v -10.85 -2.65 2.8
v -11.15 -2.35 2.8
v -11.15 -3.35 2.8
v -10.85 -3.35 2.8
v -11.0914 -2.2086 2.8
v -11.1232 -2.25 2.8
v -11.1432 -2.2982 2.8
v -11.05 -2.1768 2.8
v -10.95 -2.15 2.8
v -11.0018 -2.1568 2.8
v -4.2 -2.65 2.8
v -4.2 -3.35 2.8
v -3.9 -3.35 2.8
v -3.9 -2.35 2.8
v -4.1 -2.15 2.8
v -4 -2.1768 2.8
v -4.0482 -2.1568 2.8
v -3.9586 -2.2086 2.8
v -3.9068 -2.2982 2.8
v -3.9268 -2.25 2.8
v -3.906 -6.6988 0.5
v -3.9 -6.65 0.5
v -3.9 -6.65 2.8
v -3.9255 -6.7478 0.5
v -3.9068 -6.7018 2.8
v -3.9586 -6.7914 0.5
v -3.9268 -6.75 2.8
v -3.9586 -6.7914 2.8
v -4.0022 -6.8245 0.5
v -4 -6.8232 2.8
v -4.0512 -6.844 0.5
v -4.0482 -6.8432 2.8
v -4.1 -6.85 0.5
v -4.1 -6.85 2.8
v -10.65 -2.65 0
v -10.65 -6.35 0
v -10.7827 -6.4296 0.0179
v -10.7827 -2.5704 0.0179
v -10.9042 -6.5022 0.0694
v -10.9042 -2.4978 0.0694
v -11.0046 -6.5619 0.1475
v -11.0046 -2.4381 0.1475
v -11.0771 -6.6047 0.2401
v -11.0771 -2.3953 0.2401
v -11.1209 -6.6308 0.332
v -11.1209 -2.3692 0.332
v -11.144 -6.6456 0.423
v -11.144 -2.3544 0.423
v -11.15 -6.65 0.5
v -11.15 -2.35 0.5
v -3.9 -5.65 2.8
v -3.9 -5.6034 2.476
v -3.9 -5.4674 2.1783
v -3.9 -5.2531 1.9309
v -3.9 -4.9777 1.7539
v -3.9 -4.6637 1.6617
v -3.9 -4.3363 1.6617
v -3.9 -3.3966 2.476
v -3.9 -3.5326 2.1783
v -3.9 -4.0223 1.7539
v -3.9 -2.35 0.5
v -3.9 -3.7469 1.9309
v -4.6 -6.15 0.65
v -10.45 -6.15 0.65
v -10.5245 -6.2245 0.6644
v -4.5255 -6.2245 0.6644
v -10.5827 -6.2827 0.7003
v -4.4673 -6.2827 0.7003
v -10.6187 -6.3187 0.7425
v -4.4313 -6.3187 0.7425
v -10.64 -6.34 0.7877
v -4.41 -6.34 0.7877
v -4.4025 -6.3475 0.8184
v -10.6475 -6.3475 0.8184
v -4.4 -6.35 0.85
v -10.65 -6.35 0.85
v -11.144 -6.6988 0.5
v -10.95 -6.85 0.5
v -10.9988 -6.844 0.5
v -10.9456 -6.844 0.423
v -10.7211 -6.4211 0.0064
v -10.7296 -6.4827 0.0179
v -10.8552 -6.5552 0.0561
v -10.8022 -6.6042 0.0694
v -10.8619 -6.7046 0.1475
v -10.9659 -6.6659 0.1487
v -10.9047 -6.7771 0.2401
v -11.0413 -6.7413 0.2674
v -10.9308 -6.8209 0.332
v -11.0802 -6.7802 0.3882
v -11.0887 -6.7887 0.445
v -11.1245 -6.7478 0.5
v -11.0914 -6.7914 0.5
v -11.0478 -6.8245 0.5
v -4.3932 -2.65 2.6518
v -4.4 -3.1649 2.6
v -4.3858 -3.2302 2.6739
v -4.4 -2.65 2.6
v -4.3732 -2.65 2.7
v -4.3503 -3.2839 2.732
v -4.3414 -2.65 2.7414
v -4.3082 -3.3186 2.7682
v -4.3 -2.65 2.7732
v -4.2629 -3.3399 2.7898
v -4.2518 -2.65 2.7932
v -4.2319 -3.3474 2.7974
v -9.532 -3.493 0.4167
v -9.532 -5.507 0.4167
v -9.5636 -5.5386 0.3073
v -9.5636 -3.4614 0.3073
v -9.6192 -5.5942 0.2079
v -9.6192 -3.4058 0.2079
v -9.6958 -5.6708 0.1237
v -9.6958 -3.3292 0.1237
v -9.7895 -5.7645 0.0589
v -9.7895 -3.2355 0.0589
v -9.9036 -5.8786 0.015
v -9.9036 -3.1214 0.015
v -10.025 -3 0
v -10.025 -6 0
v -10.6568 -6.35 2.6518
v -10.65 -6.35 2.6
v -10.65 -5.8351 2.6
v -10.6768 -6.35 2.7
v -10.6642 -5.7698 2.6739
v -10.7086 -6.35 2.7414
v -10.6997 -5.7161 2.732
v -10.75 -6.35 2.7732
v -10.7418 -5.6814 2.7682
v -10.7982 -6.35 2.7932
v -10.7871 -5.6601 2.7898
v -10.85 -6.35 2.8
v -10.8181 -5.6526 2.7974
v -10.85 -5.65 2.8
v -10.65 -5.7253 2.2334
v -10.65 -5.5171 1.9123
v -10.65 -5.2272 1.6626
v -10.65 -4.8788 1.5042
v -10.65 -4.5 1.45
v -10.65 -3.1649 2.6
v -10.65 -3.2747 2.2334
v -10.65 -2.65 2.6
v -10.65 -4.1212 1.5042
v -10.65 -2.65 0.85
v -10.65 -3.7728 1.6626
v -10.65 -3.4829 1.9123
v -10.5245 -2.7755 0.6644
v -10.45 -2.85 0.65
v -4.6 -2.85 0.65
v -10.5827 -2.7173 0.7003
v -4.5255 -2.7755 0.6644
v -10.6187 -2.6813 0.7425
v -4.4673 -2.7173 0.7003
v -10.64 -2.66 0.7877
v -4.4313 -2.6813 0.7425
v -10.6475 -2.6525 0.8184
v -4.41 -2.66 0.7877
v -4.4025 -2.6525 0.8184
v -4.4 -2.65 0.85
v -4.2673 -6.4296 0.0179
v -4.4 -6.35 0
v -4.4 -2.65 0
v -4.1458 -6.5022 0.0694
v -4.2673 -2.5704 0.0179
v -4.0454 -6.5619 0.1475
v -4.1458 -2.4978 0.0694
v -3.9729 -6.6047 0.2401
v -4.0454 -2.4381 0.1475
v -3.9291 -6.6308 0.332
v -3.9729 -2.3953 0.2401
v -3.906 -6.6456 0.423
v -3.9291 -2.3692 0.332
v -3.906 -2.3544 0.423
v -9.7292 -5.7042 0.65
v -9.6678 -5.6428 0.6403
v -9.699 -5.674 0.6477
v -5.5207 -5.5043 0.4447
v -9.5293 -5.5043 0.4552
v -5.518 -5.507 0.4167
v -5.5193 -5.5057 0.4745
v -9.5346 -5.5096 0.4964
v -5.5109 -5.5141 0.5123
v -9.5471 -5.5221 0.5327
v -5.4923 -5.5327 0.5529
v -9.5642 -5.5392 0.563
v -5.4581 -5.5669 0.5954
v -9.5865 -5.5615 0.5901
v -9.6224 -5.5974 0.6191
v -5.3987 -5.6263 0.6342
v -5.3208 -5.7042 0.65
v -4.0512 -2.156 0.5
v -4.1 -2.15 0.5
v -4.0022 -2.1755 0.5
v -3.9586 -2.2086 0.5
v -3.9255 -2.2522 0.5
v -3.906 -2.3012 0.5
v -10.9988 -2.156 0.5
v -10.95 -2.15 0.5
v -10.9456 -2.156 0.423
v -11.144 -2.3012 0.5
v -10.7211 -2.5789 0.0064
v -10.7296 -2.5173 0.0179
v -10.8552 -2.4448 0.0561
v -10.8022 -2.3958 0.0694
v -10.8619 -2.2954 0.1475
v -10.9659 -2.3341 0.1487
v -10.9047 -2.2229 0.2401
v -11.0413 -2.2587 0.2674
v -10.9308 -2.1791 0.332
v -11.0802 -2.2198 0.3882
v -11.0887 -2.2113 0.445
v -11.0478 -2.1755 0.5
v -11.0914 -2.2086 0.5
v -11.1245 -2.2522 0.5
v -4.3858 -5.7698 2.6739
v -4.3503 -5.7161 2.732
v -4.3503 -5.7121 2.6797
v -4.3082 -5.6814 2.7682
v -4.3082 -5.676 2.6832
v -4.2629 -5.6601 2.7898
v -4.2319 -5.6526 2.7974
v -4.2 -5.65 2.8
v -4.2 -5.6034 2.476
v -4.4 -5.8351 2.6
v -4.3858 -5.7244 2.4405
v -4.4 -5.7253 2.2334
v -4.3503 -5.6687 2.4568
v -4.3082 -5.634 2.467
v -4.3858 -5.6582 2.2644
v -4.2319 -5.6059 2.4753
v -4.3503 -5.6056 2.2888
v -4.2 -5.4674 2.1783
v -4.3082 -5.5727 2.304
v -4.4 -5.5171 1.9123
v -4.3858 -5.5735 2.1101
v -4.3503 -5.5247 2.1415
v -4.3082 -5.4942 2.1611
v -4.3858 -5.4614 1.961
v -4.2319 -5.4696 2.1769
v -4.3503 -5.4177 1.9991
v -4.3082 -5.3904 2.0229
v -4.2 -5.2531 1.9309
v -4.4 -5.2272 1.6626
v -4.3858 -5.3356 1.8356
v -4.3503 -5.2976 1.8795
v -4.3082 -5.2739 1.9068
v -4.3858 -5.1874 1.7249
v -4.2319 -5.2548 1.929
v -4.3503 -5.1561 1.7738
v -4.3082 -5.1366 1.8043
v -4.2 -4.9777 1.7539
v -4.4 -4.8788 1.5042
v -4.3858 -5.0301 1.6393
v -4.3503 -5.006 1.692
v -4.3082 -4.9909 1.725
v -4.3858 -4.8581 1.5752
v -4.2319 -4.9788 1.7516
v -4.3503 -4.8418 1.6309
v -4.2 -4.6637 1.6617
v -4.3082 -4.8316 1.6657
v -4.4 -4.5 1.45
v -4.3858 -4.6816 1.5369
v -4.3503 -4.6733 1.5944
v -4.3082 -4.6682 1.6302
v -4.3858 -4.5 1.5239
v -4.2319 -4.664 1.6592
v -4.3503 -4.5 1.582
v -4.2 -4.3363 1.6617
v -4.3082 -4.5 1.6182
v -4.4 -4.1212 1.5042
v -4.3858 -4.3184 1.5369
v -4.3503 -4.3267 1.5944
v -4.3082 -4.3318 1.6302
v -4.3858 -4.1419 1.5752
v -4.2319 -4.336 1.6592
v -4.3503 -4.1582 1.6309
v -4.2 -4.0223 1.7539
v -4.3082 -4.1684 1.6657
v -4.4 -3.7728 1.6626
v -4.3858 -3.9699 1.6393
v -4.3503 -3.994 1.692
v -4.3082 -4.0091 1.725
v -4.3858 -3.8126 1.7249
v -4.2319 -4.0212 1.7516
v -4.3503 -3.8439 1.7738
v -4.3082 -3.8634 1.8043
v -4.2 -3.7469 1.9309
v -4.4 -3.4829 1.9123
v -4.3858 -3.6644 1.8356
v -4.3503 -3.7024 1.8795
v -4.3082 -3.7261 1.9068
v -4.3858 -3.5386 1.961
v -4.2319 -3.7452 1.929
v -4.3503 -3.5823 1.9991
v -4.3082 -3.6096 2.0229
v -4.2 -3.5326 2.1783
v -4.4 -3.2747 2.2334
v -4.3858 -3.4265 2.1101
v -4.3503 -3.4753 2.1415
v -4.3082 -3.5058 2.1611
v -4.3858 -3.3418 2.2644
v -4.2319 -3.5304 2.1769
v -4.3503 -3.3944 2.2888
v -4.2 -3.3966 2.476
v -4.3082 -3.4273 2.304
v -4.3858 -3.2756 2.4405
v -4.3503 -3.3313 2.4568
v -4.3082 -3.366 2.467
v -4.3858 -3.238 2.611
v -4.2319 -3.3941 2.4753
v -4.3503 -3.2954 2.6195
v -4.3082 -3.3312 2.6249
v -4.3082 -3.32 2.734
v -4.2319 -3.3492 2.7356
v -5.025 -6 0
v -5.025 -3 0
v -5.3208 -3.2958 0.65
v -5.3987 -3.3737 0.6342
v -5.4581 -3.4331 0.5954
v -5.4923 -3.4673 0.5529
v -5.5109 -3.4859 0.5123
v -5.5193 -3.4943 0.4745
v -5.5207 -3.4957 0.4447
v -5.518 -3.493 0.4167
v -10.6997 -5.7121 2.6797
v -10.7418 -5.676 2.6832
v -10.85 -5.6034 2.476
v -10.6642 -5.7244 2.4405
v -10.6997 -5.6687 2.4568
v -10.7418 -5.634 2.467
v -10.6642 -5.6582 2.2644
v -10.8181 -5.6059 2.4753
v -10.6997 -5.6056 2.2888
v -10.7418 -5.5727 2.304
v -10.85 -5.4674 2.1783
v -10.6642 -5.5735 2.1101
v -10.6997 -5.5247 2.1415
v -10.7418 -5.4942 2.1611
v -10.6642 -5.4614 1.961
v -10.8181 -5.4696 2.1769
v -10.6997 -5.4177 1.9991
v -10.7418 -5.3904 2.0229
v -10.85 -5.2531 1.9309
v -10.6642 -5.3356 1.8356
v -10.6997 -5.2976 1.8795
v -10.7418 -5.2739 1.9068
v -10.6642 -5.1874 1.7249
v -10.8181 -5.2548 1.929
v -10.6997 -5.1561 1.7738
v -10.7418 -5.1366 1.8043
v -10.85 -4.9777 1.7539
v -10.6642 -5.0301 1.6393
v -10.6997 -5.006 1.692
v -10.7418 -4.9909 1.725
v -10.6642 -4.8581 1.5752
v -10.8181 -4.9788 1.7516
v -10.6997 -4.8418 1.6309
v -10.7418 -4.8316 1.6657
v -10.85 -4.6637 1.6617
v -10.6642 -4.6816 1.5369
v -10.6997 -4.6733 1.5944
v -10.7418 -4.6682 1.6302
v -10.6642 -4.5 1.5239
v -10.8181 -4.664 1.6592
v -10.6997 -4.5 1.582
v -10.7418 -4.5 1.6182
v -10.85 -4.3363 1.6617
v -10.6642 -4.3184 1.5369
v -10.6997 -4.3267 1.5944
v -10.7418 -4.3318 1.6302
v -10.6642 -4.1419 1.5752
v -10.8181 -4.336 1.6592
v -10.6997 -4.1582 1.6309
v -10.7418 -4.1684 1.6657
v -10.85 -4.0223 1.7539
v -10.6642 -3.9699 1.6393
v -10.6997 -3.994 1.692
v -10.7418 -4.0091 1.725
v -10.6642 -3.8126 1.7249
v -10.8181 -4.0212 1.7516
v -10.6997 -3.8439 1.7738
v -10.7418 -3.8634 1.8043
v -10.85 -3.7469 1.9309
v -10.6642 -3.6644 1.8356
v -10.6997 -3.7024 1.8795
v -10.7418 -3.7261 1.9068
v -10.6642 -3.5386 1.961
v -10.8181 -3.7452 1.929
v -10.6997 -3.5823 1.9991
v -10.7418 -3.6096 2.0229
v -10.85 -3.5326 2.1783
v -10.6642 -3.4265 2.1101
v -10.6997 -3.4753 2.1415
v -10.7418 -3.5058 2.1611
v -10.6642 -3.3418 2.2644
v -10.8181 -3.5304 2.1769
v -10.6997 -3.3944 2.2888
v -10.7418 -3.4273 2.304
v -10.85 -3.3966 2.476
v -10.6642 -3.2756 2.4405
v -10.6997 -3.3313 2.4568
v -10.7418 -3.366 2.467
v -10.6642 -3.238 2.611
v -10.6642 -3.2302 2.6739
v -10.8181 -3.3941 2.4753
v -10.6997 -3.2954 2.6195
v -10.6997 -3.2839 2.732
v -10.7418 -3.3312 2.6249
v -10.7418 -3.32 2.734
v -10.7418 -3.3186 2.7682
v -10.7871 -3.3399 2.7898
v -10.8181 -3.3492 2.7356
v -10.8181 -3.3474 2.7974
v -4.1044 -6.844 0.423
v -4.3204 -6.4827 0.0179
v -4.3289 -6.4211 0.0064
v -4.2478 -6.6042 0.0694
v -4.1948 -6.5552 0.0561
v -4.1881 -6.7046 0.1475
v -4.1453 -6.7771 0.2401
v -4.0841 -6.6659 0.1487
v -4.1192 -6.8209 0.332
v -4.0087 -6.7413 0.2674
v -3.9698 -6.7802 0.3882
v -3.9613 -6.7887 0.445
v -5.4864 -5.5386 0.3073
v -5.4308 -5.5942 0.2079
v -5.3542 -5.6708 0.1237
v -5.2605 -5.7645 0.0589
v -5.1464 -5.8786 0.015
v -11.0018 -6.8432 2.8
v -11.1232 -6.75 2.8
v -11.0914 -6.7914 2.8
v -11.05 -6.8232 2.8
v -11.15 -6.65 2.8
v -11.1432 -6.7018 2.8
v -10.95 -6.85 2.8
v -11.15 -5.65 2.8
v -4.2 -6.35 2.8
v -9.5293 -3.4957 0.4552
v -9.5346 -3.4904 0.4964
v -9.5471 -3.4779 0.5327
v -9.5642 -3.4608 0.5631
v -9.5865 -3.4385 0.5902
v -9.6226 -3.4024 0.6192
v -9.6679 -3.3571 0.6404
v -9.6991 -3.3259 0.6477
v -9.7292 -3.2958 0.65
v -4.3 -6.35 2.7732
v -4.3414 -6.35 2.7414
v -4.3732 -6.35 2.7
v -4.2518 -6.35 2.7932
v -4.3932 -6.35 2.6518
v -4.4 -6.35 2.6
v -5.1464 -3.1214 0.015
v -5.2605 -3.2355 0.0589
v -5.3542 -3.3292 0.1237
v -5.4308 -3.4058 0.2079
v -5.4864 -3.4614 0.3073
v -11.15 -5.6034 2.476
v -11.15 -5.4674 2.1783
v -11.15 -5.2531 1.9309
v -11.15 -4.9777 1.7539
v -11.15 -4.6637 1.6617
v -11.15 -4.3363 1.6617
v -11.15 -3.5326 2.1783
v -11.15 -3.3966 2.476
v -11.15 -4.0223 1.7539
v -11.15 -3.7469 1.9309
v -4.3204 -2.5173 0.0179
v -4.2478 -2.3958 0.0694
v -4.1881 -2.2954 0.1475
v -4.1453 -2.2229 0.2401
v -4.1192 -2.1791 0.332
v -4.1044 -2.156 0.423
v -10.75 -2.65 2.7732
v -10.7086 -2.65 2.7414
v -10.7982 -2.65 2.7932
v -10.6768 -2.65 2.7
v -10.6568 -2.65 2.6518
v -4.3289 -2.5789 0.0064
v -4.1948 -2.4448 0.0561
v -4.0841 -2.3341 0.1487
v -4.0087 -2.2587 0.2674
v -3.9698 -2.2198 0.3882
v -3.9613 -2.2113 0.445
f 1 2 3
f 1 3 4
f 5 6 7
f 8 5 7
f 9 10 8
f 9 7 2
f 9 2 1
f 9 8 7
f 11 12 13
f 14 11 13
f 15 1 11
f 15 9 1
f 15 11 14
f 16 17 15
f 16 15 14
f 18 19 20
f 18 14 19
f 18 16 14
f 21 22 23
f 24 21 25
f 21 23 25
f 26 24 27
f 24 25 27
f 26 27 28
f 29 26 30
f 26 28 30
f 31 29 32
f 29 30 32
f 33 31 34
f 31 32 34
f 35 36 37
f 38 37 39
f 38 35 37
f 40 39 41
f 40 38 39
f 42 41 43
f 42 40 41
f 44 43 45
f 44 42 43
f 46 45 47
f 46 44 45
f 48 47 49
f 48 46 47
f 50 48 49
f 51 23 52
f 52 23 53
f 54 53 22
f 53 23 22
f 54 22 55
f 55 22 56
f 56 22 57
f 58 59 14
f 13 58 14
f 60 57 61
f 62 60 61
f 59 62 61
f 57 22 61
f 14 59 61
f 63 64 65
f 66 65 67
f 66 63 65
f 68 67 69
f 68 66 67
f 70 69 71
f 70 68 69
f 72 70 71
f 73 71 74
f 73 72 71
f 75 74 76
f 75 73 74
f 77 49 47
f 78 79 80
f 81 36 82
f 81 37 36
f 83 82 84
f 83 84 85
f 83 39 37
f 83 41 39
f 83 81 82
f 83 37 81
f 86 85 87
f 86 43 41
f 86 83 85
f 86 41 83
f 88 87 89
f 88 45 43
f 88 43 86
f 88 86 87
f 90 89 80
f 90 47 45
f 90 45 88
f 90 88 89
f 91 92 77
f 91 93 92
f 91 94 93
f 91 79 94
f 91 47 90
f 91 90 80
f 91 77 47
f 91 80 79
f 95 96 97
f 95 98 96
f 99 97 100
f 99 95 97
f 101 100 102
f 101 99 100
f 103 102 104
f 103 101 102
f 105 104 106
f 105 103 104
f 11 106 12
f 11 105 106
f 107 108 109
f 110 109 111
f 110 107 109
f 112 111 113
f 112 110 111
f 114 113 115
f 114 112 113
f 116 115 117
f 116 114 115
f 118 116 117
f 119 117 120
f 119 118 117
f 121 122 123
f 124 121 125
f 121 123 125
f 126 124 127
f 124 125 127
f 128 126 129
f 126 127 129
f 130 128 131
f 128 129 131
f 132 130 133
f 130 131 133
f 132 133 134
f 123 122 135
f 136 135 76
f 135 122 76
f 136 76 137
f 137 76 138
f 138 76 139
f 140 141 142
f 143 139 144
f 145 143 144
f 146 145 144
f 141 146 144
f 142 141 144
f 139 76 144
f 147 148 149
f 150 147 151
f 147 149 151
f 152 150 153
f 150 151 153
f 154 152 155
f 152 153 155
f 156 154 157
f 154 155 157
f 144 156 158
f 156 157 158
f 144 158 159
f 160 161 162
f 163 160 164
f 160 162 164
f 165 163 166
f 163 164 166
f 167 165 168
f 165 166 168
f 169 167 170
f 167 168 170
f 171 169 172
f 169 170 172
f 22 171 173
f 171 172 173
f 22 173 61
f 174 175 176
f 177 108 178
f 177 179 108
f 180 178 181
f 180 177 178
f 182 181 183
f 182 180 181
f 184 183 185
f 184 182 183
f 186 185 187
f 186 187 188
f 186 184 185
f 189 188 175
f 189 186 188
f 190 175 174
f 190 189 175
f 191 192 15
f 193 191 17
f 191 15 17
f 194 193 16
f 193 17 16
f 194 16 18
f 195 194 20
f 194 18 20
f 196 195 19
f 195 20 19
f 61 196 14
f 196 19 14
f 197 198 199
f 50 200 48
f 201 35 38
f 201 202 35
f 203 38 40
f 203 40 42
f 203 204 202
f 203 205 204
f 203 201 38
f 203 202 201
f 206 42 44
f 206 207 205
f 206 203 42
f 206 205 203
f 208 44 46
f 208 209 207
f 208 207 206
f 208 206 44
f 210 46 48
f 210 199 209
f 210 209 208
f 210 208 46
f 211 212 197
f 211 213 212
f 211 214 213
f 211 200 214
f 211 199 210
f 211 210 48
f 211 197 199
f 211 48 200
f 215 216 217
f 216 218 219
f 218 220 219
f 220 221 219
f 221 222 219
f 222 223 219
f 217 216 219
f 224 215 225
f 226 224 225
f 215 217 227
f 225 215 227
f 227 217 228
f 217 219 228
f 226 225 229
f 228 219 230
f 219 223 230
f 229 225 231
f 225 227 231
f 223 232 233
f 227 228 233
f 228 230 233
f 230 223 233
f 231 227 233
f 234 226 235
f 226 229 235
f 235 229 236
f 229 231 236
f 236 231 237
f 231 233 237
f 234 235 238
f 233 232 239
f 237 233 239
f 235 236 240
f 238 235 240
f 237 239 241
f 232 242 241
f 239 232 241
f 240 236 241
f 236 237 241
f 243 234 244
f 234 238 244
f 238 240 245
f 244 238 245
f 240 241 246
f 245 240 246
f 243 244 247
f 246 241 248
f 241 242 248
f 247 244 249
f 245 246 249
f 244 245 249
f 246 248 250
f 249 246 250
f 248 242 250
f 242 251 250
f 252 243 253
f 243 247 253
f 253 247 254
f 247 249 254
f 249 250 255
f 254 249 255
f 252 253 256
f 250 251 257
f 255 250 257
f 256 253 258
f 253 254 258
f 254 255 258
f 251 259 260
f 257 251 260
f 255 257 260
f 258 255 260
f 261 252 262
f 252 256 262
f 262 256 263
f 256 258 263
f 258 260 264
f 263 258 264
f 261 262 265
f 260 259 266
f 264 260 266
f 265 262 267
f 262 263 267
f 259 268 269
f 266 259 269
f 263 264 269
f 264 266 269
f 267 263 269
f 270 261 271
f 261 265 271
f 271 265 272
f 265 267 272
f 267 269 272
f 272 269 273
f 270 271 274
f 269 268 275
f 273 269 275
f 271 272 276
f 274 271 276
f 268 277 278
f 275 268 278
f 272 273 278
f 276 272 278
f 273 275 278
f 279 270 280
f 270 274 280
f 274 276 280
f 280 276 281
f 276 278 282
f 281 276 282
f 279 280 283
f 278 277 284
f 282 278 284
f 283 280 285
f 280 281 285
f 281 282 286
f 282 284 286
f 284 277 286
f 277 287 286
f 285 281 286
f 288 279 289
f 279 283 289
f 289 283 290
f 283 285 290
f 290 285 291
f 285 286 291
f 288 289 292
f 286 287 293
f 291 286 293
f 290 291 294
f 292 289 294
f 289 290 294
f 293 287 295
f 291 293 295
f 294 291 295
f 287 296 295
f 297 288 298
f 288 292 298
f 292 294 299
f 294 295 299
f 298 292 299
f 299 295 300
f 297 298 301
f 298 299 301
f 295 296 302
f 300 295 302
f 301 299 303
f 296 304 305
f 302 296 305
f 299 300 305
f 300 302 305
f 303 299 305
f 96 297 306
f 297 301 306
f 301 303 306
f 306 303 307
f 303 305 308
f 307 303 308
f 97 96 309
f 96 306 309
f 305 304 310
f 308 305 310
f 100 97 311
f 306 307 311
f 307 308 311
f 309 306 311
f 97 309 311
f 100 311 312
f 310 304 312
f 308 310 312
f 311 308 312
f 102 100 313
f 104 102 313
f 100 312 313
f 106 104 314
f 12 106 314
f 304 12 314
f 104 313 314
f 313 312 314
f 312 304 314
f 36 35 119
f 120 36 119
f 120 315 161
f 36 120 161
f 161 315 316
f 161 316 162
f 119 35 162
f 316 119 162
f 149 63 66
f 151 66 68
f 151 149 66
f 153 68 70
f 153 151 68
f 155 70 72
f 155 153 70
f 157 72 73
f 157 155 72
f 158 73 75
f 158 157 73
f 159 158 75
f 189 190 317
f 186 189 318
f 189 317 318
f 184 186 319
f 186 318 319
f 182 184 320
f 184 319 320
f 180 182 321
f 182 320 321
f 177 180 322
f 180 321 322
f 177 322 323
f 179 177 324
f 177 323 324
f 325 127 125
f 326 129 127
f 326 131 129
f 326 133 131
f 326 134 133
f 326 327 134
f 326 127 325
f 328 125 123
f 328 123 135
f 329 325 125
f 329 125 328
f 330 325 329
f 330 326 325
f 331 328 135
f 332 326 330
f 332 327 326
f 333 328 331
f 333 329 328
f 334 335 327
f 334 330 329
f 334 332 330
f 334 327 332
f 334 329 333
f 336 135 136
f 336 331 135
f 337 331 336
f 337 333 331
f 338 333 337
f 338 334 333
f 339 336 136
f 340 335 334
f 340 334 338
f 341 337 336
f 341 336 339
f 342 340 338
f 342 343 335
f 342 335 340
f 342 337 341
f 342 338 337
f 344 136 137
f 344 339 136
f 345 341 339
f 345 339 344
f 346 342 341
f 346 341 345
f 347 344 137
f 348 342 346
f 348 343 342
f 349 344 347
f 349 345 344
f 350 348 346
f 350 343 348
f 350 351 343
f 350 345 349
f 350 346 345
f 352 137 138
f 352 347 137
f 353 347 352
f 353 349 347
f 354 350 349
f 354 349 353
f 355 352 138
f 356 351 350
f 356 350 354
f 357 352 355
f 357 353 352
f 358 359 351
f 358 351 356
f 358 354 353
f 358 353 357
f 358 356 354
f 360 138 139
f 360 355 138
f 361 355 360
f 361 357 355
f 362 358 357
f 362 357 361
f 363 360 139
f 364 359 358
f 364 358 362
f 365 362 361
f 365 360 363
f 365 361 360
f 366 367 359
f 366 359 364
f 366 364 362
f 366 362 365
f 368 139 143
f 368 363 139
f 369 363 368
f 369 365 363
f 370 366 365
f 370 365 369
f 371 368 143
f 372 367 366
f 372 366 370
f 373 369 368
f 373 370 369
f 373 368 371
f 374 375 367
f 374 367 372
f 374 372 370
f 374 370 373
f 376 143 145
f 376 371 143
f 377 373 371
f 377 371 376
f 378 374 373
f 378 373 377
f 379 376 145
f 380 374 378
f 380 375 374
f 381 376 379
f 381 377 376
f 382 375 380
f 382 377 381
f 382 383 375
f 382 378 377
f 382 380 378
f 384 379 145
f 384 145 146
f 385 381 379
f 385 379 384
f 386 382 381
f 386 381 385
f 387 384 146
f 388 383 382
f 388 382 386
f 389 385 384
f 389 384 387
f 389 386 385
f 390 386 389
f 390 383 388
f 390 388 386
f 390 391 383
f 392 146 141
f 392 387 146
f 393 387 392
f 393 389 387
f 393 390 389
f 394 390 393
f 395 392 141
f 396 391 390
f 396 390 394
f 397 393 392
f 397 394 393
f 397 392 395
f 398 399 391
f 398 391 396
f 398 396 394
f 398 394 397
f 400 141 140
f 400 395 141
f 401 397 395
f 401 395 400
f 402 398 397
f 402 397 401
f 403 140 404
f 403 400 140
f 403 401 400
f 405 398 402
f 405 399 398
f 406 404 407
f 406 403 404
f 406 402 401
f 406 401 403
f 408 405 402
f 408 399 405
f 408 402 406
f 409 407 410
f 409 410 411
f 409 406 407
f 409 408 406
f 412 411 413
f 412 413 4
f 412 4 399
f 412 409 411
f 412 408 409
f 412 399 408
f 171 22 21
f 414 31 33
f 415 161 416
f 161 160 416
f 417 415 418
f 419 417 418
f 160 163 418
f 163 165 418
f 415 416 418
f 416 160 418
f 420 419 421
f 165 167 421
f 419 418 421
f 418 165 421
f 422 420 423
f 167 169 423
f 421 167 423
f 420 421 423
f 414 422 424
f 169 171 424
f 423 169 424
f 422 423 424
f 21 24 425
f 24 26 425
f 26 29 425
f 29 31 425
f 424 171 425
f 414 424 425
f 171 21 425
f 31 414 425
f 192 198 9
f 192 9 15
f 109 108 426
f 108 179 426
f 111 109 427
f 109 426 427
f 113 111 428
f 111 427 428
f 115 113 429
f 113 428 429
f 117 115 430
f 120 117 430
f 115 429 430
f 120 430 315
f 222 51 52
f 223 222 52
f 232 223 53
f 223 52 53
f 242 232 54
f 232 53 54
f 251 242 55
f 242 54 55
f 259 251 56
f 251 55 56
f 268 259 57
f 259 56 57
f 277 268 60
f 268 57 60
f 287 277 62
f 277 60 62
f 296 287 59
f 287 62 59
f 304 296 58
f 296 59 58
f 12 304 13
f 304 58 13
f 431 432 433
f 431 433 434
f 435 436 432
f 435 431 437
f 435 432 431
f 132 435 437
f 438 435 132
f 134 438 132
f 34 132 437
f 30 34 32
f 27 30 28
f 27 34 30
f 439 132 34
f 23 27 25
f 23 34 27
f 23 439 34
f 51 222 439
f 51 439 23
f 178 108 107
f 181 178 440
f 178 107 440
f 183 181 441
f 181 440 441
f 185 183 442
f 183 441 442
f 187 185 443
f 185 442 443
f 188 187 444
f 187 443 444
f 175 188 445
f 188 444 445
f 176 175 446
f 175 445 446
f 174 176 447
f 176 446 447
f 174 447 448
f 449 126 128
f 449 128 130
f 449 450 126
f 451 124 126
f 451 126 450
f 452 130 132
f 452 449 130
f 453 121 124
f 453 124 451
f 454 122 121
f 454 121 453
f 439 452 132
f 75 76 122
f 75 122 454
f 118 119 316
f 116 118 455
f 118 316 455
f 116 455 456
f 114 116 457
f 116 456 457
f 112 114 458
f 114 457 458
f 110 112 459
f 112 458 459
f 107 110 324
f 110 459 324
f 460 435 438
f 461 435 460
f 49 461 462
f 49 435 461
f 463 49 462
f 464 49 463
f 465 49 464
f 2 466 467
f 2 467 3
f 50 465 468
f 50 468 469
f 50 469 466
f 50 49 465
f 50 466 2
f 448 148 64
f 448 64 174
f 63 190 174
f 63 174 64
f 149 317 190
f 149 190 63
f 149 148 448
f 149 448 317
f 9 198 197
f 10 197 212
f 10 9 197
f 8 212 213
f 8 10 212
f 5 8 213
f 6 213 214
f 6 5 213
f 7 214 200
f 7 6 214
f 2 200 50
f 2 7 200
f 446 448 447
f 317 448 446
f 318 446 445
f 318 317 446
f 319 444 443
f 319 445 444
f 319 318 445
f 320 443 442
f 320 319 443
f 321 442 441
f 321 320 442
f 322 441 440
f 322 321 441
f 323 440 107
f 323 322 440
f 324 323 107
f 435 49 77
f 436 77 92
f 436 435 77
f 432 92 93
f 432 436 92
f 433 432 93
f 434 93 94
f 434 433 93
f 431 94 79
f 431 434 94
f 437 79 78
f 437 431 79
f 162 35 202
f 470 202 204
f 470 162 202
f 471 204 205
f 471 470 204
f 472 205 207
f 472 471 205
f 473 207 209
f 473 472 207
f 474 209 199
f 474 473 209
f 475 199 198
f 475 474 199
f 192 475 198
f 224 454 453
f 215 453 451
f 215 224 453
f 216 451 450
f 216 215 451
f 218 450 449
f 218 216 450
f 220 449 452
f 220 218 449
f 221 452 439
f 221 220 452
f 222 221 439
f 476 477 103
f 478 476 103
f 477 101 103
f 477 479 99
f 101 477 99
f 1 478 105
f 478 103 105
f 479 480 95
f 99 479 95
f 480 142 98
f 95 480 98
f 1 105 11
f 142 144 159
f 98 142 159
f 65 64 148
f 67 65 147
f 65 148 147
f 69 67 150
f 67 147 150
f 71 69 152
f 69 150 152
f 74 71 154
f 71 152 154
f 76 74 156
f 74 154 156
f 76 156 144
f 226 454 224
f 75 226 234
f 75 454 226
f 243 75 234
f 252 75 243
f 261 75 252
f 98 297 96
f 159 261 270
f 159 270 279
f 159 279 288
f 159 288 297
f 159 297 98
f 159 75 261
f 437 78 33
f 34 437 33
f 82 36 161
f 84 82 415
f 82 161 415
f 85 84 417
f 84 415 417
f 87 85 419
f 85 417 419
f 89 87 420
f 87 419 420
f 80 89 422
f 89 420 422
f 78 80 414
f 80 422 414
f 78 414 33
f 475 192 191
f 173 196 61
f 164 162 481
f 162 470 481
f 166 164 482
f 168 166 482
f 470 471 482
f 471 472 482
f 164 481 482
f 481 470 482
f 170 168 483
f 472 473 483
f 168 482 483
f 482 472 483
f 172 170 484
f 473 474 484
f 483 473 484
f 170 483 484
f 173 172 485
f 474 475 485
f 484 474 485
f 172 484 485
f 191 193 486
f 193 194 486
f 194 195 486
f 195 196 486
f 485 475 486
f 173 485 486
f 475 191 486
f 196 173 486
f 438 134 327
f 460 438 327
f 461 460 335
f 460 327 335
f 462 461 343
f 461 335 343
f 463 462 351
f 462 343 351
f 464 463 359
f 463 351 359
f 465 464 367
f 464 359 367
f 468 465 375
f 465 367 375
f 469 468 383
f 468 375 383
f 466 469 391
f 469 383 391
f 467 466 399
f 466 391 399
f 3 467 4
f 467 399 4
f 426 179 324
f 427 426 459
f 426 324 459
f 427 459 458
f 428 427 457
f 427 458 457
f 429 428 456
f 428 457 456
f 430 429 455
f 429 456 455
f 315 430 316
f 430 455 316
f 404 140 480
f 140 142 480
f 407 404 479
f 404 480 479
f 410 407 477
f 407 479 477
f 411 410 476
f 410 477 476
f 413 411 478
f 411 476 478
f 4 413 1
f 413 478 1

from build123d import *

# Parameters (mm, degrees)
F0_W     = 7.25
F0_H     = 4.7
F0_W_2   = 6.25
F0_H_2   = 3.7
F1_DEPTH = 2.8
F0_W_3   = 4
F0_H_3   = 2
F2_DEPTH = 0.65
F3_R     = 0.5
F5_DEPTH = 25
F6_R     = 0.2


with BuildPart() as f1:
    # F0 (on Top) → F1 (new body)
    with BuildSketch(Plane.XY):
        with Locations((-7.525, -4.5)):
            Rectangle(F0_W, F0_H)
        with Locations((-7.525, -4.5)):
            Rectangle(F0_W_2, F0_H_2, mode=Mode.SUBTRACT)
    extrude(amount=F1_DEPTH)

    # F0 (on Top) → F2 (join)
    with BuildSketch(Plane.XY):
        with Locations((-7.525, -4.5)):
            Rectangle(F0_W_2, F0_H_2)
        with Locations((-7.525, -4.5)):
            Rectangle(F0_W_3, F0_H_3, mode=Mode.SUBTRACT)
    extrude(amount=F2_DEPTH)

    # F3
    f3_edges = [f1.edges().sort_by_distance(p)[0] for p in [
        (-7.525, -2.15, 0),
        (-11.15, -4.5, 0),
        (-7.525, -6.85, 0),
        (-3.9, -4.5, 0),
        (-5.525, -4.5, 0),
        (-7.525, -5.5, 0),
        (-9.525, -4.5, 0),
        (-7.525, -3.5, 0),
    ]]
    fillet(f3_edges, radius=F3_R)

    # F4 (on face) → F5 (cut)
    with BuildSketch(Plane.YZ.offset(-3.9)):
        with BuildLine():
            ThreePointArc((-5.65, 2.8), (-4.5, 1.65), (-3.35, 2.8))
            Line((-3.35, 2.8), (-5.65, 2.8))
        make_face()
    extrude(amount=-F5_DEPTH, mode=Mode.SUBTRACT)

    # F6
    f6_edges = [f1.edges().sort_by_distance(p)[0] for p in [
        (-7.525, -2.65, 0.65),
        (-10.65, -4.5, 0.65),
        (-7.525, -6.35, 0.65),
        (-4.4, -4.5, 0.65),
        (-9.525, -4.5, 0.65),
        (-7.525, -3.5, 0.65),
        (-5.525, -4.5, 0.65),
        (-7.525, -5.5, 0.65),
        (-10.65, -4.5, 1.65),
        (-4.4, -4.5, 1.65),
        (-10.65, -3, 2.8),
        (-3.9, -2.15, 1.65),
        (-3.9, -6.85, 1.65),
        (-11.15, -2.15, 1.65),
        (-11.15, -6.85, 1.65),
        (-4.4, -3, 2.8),
        (-4.4, -6, 2.8),
        (-10.65, -6, 2.8),
    ]]
    fillet(f6_edges, radius=F6_R)


solid = f1.part
